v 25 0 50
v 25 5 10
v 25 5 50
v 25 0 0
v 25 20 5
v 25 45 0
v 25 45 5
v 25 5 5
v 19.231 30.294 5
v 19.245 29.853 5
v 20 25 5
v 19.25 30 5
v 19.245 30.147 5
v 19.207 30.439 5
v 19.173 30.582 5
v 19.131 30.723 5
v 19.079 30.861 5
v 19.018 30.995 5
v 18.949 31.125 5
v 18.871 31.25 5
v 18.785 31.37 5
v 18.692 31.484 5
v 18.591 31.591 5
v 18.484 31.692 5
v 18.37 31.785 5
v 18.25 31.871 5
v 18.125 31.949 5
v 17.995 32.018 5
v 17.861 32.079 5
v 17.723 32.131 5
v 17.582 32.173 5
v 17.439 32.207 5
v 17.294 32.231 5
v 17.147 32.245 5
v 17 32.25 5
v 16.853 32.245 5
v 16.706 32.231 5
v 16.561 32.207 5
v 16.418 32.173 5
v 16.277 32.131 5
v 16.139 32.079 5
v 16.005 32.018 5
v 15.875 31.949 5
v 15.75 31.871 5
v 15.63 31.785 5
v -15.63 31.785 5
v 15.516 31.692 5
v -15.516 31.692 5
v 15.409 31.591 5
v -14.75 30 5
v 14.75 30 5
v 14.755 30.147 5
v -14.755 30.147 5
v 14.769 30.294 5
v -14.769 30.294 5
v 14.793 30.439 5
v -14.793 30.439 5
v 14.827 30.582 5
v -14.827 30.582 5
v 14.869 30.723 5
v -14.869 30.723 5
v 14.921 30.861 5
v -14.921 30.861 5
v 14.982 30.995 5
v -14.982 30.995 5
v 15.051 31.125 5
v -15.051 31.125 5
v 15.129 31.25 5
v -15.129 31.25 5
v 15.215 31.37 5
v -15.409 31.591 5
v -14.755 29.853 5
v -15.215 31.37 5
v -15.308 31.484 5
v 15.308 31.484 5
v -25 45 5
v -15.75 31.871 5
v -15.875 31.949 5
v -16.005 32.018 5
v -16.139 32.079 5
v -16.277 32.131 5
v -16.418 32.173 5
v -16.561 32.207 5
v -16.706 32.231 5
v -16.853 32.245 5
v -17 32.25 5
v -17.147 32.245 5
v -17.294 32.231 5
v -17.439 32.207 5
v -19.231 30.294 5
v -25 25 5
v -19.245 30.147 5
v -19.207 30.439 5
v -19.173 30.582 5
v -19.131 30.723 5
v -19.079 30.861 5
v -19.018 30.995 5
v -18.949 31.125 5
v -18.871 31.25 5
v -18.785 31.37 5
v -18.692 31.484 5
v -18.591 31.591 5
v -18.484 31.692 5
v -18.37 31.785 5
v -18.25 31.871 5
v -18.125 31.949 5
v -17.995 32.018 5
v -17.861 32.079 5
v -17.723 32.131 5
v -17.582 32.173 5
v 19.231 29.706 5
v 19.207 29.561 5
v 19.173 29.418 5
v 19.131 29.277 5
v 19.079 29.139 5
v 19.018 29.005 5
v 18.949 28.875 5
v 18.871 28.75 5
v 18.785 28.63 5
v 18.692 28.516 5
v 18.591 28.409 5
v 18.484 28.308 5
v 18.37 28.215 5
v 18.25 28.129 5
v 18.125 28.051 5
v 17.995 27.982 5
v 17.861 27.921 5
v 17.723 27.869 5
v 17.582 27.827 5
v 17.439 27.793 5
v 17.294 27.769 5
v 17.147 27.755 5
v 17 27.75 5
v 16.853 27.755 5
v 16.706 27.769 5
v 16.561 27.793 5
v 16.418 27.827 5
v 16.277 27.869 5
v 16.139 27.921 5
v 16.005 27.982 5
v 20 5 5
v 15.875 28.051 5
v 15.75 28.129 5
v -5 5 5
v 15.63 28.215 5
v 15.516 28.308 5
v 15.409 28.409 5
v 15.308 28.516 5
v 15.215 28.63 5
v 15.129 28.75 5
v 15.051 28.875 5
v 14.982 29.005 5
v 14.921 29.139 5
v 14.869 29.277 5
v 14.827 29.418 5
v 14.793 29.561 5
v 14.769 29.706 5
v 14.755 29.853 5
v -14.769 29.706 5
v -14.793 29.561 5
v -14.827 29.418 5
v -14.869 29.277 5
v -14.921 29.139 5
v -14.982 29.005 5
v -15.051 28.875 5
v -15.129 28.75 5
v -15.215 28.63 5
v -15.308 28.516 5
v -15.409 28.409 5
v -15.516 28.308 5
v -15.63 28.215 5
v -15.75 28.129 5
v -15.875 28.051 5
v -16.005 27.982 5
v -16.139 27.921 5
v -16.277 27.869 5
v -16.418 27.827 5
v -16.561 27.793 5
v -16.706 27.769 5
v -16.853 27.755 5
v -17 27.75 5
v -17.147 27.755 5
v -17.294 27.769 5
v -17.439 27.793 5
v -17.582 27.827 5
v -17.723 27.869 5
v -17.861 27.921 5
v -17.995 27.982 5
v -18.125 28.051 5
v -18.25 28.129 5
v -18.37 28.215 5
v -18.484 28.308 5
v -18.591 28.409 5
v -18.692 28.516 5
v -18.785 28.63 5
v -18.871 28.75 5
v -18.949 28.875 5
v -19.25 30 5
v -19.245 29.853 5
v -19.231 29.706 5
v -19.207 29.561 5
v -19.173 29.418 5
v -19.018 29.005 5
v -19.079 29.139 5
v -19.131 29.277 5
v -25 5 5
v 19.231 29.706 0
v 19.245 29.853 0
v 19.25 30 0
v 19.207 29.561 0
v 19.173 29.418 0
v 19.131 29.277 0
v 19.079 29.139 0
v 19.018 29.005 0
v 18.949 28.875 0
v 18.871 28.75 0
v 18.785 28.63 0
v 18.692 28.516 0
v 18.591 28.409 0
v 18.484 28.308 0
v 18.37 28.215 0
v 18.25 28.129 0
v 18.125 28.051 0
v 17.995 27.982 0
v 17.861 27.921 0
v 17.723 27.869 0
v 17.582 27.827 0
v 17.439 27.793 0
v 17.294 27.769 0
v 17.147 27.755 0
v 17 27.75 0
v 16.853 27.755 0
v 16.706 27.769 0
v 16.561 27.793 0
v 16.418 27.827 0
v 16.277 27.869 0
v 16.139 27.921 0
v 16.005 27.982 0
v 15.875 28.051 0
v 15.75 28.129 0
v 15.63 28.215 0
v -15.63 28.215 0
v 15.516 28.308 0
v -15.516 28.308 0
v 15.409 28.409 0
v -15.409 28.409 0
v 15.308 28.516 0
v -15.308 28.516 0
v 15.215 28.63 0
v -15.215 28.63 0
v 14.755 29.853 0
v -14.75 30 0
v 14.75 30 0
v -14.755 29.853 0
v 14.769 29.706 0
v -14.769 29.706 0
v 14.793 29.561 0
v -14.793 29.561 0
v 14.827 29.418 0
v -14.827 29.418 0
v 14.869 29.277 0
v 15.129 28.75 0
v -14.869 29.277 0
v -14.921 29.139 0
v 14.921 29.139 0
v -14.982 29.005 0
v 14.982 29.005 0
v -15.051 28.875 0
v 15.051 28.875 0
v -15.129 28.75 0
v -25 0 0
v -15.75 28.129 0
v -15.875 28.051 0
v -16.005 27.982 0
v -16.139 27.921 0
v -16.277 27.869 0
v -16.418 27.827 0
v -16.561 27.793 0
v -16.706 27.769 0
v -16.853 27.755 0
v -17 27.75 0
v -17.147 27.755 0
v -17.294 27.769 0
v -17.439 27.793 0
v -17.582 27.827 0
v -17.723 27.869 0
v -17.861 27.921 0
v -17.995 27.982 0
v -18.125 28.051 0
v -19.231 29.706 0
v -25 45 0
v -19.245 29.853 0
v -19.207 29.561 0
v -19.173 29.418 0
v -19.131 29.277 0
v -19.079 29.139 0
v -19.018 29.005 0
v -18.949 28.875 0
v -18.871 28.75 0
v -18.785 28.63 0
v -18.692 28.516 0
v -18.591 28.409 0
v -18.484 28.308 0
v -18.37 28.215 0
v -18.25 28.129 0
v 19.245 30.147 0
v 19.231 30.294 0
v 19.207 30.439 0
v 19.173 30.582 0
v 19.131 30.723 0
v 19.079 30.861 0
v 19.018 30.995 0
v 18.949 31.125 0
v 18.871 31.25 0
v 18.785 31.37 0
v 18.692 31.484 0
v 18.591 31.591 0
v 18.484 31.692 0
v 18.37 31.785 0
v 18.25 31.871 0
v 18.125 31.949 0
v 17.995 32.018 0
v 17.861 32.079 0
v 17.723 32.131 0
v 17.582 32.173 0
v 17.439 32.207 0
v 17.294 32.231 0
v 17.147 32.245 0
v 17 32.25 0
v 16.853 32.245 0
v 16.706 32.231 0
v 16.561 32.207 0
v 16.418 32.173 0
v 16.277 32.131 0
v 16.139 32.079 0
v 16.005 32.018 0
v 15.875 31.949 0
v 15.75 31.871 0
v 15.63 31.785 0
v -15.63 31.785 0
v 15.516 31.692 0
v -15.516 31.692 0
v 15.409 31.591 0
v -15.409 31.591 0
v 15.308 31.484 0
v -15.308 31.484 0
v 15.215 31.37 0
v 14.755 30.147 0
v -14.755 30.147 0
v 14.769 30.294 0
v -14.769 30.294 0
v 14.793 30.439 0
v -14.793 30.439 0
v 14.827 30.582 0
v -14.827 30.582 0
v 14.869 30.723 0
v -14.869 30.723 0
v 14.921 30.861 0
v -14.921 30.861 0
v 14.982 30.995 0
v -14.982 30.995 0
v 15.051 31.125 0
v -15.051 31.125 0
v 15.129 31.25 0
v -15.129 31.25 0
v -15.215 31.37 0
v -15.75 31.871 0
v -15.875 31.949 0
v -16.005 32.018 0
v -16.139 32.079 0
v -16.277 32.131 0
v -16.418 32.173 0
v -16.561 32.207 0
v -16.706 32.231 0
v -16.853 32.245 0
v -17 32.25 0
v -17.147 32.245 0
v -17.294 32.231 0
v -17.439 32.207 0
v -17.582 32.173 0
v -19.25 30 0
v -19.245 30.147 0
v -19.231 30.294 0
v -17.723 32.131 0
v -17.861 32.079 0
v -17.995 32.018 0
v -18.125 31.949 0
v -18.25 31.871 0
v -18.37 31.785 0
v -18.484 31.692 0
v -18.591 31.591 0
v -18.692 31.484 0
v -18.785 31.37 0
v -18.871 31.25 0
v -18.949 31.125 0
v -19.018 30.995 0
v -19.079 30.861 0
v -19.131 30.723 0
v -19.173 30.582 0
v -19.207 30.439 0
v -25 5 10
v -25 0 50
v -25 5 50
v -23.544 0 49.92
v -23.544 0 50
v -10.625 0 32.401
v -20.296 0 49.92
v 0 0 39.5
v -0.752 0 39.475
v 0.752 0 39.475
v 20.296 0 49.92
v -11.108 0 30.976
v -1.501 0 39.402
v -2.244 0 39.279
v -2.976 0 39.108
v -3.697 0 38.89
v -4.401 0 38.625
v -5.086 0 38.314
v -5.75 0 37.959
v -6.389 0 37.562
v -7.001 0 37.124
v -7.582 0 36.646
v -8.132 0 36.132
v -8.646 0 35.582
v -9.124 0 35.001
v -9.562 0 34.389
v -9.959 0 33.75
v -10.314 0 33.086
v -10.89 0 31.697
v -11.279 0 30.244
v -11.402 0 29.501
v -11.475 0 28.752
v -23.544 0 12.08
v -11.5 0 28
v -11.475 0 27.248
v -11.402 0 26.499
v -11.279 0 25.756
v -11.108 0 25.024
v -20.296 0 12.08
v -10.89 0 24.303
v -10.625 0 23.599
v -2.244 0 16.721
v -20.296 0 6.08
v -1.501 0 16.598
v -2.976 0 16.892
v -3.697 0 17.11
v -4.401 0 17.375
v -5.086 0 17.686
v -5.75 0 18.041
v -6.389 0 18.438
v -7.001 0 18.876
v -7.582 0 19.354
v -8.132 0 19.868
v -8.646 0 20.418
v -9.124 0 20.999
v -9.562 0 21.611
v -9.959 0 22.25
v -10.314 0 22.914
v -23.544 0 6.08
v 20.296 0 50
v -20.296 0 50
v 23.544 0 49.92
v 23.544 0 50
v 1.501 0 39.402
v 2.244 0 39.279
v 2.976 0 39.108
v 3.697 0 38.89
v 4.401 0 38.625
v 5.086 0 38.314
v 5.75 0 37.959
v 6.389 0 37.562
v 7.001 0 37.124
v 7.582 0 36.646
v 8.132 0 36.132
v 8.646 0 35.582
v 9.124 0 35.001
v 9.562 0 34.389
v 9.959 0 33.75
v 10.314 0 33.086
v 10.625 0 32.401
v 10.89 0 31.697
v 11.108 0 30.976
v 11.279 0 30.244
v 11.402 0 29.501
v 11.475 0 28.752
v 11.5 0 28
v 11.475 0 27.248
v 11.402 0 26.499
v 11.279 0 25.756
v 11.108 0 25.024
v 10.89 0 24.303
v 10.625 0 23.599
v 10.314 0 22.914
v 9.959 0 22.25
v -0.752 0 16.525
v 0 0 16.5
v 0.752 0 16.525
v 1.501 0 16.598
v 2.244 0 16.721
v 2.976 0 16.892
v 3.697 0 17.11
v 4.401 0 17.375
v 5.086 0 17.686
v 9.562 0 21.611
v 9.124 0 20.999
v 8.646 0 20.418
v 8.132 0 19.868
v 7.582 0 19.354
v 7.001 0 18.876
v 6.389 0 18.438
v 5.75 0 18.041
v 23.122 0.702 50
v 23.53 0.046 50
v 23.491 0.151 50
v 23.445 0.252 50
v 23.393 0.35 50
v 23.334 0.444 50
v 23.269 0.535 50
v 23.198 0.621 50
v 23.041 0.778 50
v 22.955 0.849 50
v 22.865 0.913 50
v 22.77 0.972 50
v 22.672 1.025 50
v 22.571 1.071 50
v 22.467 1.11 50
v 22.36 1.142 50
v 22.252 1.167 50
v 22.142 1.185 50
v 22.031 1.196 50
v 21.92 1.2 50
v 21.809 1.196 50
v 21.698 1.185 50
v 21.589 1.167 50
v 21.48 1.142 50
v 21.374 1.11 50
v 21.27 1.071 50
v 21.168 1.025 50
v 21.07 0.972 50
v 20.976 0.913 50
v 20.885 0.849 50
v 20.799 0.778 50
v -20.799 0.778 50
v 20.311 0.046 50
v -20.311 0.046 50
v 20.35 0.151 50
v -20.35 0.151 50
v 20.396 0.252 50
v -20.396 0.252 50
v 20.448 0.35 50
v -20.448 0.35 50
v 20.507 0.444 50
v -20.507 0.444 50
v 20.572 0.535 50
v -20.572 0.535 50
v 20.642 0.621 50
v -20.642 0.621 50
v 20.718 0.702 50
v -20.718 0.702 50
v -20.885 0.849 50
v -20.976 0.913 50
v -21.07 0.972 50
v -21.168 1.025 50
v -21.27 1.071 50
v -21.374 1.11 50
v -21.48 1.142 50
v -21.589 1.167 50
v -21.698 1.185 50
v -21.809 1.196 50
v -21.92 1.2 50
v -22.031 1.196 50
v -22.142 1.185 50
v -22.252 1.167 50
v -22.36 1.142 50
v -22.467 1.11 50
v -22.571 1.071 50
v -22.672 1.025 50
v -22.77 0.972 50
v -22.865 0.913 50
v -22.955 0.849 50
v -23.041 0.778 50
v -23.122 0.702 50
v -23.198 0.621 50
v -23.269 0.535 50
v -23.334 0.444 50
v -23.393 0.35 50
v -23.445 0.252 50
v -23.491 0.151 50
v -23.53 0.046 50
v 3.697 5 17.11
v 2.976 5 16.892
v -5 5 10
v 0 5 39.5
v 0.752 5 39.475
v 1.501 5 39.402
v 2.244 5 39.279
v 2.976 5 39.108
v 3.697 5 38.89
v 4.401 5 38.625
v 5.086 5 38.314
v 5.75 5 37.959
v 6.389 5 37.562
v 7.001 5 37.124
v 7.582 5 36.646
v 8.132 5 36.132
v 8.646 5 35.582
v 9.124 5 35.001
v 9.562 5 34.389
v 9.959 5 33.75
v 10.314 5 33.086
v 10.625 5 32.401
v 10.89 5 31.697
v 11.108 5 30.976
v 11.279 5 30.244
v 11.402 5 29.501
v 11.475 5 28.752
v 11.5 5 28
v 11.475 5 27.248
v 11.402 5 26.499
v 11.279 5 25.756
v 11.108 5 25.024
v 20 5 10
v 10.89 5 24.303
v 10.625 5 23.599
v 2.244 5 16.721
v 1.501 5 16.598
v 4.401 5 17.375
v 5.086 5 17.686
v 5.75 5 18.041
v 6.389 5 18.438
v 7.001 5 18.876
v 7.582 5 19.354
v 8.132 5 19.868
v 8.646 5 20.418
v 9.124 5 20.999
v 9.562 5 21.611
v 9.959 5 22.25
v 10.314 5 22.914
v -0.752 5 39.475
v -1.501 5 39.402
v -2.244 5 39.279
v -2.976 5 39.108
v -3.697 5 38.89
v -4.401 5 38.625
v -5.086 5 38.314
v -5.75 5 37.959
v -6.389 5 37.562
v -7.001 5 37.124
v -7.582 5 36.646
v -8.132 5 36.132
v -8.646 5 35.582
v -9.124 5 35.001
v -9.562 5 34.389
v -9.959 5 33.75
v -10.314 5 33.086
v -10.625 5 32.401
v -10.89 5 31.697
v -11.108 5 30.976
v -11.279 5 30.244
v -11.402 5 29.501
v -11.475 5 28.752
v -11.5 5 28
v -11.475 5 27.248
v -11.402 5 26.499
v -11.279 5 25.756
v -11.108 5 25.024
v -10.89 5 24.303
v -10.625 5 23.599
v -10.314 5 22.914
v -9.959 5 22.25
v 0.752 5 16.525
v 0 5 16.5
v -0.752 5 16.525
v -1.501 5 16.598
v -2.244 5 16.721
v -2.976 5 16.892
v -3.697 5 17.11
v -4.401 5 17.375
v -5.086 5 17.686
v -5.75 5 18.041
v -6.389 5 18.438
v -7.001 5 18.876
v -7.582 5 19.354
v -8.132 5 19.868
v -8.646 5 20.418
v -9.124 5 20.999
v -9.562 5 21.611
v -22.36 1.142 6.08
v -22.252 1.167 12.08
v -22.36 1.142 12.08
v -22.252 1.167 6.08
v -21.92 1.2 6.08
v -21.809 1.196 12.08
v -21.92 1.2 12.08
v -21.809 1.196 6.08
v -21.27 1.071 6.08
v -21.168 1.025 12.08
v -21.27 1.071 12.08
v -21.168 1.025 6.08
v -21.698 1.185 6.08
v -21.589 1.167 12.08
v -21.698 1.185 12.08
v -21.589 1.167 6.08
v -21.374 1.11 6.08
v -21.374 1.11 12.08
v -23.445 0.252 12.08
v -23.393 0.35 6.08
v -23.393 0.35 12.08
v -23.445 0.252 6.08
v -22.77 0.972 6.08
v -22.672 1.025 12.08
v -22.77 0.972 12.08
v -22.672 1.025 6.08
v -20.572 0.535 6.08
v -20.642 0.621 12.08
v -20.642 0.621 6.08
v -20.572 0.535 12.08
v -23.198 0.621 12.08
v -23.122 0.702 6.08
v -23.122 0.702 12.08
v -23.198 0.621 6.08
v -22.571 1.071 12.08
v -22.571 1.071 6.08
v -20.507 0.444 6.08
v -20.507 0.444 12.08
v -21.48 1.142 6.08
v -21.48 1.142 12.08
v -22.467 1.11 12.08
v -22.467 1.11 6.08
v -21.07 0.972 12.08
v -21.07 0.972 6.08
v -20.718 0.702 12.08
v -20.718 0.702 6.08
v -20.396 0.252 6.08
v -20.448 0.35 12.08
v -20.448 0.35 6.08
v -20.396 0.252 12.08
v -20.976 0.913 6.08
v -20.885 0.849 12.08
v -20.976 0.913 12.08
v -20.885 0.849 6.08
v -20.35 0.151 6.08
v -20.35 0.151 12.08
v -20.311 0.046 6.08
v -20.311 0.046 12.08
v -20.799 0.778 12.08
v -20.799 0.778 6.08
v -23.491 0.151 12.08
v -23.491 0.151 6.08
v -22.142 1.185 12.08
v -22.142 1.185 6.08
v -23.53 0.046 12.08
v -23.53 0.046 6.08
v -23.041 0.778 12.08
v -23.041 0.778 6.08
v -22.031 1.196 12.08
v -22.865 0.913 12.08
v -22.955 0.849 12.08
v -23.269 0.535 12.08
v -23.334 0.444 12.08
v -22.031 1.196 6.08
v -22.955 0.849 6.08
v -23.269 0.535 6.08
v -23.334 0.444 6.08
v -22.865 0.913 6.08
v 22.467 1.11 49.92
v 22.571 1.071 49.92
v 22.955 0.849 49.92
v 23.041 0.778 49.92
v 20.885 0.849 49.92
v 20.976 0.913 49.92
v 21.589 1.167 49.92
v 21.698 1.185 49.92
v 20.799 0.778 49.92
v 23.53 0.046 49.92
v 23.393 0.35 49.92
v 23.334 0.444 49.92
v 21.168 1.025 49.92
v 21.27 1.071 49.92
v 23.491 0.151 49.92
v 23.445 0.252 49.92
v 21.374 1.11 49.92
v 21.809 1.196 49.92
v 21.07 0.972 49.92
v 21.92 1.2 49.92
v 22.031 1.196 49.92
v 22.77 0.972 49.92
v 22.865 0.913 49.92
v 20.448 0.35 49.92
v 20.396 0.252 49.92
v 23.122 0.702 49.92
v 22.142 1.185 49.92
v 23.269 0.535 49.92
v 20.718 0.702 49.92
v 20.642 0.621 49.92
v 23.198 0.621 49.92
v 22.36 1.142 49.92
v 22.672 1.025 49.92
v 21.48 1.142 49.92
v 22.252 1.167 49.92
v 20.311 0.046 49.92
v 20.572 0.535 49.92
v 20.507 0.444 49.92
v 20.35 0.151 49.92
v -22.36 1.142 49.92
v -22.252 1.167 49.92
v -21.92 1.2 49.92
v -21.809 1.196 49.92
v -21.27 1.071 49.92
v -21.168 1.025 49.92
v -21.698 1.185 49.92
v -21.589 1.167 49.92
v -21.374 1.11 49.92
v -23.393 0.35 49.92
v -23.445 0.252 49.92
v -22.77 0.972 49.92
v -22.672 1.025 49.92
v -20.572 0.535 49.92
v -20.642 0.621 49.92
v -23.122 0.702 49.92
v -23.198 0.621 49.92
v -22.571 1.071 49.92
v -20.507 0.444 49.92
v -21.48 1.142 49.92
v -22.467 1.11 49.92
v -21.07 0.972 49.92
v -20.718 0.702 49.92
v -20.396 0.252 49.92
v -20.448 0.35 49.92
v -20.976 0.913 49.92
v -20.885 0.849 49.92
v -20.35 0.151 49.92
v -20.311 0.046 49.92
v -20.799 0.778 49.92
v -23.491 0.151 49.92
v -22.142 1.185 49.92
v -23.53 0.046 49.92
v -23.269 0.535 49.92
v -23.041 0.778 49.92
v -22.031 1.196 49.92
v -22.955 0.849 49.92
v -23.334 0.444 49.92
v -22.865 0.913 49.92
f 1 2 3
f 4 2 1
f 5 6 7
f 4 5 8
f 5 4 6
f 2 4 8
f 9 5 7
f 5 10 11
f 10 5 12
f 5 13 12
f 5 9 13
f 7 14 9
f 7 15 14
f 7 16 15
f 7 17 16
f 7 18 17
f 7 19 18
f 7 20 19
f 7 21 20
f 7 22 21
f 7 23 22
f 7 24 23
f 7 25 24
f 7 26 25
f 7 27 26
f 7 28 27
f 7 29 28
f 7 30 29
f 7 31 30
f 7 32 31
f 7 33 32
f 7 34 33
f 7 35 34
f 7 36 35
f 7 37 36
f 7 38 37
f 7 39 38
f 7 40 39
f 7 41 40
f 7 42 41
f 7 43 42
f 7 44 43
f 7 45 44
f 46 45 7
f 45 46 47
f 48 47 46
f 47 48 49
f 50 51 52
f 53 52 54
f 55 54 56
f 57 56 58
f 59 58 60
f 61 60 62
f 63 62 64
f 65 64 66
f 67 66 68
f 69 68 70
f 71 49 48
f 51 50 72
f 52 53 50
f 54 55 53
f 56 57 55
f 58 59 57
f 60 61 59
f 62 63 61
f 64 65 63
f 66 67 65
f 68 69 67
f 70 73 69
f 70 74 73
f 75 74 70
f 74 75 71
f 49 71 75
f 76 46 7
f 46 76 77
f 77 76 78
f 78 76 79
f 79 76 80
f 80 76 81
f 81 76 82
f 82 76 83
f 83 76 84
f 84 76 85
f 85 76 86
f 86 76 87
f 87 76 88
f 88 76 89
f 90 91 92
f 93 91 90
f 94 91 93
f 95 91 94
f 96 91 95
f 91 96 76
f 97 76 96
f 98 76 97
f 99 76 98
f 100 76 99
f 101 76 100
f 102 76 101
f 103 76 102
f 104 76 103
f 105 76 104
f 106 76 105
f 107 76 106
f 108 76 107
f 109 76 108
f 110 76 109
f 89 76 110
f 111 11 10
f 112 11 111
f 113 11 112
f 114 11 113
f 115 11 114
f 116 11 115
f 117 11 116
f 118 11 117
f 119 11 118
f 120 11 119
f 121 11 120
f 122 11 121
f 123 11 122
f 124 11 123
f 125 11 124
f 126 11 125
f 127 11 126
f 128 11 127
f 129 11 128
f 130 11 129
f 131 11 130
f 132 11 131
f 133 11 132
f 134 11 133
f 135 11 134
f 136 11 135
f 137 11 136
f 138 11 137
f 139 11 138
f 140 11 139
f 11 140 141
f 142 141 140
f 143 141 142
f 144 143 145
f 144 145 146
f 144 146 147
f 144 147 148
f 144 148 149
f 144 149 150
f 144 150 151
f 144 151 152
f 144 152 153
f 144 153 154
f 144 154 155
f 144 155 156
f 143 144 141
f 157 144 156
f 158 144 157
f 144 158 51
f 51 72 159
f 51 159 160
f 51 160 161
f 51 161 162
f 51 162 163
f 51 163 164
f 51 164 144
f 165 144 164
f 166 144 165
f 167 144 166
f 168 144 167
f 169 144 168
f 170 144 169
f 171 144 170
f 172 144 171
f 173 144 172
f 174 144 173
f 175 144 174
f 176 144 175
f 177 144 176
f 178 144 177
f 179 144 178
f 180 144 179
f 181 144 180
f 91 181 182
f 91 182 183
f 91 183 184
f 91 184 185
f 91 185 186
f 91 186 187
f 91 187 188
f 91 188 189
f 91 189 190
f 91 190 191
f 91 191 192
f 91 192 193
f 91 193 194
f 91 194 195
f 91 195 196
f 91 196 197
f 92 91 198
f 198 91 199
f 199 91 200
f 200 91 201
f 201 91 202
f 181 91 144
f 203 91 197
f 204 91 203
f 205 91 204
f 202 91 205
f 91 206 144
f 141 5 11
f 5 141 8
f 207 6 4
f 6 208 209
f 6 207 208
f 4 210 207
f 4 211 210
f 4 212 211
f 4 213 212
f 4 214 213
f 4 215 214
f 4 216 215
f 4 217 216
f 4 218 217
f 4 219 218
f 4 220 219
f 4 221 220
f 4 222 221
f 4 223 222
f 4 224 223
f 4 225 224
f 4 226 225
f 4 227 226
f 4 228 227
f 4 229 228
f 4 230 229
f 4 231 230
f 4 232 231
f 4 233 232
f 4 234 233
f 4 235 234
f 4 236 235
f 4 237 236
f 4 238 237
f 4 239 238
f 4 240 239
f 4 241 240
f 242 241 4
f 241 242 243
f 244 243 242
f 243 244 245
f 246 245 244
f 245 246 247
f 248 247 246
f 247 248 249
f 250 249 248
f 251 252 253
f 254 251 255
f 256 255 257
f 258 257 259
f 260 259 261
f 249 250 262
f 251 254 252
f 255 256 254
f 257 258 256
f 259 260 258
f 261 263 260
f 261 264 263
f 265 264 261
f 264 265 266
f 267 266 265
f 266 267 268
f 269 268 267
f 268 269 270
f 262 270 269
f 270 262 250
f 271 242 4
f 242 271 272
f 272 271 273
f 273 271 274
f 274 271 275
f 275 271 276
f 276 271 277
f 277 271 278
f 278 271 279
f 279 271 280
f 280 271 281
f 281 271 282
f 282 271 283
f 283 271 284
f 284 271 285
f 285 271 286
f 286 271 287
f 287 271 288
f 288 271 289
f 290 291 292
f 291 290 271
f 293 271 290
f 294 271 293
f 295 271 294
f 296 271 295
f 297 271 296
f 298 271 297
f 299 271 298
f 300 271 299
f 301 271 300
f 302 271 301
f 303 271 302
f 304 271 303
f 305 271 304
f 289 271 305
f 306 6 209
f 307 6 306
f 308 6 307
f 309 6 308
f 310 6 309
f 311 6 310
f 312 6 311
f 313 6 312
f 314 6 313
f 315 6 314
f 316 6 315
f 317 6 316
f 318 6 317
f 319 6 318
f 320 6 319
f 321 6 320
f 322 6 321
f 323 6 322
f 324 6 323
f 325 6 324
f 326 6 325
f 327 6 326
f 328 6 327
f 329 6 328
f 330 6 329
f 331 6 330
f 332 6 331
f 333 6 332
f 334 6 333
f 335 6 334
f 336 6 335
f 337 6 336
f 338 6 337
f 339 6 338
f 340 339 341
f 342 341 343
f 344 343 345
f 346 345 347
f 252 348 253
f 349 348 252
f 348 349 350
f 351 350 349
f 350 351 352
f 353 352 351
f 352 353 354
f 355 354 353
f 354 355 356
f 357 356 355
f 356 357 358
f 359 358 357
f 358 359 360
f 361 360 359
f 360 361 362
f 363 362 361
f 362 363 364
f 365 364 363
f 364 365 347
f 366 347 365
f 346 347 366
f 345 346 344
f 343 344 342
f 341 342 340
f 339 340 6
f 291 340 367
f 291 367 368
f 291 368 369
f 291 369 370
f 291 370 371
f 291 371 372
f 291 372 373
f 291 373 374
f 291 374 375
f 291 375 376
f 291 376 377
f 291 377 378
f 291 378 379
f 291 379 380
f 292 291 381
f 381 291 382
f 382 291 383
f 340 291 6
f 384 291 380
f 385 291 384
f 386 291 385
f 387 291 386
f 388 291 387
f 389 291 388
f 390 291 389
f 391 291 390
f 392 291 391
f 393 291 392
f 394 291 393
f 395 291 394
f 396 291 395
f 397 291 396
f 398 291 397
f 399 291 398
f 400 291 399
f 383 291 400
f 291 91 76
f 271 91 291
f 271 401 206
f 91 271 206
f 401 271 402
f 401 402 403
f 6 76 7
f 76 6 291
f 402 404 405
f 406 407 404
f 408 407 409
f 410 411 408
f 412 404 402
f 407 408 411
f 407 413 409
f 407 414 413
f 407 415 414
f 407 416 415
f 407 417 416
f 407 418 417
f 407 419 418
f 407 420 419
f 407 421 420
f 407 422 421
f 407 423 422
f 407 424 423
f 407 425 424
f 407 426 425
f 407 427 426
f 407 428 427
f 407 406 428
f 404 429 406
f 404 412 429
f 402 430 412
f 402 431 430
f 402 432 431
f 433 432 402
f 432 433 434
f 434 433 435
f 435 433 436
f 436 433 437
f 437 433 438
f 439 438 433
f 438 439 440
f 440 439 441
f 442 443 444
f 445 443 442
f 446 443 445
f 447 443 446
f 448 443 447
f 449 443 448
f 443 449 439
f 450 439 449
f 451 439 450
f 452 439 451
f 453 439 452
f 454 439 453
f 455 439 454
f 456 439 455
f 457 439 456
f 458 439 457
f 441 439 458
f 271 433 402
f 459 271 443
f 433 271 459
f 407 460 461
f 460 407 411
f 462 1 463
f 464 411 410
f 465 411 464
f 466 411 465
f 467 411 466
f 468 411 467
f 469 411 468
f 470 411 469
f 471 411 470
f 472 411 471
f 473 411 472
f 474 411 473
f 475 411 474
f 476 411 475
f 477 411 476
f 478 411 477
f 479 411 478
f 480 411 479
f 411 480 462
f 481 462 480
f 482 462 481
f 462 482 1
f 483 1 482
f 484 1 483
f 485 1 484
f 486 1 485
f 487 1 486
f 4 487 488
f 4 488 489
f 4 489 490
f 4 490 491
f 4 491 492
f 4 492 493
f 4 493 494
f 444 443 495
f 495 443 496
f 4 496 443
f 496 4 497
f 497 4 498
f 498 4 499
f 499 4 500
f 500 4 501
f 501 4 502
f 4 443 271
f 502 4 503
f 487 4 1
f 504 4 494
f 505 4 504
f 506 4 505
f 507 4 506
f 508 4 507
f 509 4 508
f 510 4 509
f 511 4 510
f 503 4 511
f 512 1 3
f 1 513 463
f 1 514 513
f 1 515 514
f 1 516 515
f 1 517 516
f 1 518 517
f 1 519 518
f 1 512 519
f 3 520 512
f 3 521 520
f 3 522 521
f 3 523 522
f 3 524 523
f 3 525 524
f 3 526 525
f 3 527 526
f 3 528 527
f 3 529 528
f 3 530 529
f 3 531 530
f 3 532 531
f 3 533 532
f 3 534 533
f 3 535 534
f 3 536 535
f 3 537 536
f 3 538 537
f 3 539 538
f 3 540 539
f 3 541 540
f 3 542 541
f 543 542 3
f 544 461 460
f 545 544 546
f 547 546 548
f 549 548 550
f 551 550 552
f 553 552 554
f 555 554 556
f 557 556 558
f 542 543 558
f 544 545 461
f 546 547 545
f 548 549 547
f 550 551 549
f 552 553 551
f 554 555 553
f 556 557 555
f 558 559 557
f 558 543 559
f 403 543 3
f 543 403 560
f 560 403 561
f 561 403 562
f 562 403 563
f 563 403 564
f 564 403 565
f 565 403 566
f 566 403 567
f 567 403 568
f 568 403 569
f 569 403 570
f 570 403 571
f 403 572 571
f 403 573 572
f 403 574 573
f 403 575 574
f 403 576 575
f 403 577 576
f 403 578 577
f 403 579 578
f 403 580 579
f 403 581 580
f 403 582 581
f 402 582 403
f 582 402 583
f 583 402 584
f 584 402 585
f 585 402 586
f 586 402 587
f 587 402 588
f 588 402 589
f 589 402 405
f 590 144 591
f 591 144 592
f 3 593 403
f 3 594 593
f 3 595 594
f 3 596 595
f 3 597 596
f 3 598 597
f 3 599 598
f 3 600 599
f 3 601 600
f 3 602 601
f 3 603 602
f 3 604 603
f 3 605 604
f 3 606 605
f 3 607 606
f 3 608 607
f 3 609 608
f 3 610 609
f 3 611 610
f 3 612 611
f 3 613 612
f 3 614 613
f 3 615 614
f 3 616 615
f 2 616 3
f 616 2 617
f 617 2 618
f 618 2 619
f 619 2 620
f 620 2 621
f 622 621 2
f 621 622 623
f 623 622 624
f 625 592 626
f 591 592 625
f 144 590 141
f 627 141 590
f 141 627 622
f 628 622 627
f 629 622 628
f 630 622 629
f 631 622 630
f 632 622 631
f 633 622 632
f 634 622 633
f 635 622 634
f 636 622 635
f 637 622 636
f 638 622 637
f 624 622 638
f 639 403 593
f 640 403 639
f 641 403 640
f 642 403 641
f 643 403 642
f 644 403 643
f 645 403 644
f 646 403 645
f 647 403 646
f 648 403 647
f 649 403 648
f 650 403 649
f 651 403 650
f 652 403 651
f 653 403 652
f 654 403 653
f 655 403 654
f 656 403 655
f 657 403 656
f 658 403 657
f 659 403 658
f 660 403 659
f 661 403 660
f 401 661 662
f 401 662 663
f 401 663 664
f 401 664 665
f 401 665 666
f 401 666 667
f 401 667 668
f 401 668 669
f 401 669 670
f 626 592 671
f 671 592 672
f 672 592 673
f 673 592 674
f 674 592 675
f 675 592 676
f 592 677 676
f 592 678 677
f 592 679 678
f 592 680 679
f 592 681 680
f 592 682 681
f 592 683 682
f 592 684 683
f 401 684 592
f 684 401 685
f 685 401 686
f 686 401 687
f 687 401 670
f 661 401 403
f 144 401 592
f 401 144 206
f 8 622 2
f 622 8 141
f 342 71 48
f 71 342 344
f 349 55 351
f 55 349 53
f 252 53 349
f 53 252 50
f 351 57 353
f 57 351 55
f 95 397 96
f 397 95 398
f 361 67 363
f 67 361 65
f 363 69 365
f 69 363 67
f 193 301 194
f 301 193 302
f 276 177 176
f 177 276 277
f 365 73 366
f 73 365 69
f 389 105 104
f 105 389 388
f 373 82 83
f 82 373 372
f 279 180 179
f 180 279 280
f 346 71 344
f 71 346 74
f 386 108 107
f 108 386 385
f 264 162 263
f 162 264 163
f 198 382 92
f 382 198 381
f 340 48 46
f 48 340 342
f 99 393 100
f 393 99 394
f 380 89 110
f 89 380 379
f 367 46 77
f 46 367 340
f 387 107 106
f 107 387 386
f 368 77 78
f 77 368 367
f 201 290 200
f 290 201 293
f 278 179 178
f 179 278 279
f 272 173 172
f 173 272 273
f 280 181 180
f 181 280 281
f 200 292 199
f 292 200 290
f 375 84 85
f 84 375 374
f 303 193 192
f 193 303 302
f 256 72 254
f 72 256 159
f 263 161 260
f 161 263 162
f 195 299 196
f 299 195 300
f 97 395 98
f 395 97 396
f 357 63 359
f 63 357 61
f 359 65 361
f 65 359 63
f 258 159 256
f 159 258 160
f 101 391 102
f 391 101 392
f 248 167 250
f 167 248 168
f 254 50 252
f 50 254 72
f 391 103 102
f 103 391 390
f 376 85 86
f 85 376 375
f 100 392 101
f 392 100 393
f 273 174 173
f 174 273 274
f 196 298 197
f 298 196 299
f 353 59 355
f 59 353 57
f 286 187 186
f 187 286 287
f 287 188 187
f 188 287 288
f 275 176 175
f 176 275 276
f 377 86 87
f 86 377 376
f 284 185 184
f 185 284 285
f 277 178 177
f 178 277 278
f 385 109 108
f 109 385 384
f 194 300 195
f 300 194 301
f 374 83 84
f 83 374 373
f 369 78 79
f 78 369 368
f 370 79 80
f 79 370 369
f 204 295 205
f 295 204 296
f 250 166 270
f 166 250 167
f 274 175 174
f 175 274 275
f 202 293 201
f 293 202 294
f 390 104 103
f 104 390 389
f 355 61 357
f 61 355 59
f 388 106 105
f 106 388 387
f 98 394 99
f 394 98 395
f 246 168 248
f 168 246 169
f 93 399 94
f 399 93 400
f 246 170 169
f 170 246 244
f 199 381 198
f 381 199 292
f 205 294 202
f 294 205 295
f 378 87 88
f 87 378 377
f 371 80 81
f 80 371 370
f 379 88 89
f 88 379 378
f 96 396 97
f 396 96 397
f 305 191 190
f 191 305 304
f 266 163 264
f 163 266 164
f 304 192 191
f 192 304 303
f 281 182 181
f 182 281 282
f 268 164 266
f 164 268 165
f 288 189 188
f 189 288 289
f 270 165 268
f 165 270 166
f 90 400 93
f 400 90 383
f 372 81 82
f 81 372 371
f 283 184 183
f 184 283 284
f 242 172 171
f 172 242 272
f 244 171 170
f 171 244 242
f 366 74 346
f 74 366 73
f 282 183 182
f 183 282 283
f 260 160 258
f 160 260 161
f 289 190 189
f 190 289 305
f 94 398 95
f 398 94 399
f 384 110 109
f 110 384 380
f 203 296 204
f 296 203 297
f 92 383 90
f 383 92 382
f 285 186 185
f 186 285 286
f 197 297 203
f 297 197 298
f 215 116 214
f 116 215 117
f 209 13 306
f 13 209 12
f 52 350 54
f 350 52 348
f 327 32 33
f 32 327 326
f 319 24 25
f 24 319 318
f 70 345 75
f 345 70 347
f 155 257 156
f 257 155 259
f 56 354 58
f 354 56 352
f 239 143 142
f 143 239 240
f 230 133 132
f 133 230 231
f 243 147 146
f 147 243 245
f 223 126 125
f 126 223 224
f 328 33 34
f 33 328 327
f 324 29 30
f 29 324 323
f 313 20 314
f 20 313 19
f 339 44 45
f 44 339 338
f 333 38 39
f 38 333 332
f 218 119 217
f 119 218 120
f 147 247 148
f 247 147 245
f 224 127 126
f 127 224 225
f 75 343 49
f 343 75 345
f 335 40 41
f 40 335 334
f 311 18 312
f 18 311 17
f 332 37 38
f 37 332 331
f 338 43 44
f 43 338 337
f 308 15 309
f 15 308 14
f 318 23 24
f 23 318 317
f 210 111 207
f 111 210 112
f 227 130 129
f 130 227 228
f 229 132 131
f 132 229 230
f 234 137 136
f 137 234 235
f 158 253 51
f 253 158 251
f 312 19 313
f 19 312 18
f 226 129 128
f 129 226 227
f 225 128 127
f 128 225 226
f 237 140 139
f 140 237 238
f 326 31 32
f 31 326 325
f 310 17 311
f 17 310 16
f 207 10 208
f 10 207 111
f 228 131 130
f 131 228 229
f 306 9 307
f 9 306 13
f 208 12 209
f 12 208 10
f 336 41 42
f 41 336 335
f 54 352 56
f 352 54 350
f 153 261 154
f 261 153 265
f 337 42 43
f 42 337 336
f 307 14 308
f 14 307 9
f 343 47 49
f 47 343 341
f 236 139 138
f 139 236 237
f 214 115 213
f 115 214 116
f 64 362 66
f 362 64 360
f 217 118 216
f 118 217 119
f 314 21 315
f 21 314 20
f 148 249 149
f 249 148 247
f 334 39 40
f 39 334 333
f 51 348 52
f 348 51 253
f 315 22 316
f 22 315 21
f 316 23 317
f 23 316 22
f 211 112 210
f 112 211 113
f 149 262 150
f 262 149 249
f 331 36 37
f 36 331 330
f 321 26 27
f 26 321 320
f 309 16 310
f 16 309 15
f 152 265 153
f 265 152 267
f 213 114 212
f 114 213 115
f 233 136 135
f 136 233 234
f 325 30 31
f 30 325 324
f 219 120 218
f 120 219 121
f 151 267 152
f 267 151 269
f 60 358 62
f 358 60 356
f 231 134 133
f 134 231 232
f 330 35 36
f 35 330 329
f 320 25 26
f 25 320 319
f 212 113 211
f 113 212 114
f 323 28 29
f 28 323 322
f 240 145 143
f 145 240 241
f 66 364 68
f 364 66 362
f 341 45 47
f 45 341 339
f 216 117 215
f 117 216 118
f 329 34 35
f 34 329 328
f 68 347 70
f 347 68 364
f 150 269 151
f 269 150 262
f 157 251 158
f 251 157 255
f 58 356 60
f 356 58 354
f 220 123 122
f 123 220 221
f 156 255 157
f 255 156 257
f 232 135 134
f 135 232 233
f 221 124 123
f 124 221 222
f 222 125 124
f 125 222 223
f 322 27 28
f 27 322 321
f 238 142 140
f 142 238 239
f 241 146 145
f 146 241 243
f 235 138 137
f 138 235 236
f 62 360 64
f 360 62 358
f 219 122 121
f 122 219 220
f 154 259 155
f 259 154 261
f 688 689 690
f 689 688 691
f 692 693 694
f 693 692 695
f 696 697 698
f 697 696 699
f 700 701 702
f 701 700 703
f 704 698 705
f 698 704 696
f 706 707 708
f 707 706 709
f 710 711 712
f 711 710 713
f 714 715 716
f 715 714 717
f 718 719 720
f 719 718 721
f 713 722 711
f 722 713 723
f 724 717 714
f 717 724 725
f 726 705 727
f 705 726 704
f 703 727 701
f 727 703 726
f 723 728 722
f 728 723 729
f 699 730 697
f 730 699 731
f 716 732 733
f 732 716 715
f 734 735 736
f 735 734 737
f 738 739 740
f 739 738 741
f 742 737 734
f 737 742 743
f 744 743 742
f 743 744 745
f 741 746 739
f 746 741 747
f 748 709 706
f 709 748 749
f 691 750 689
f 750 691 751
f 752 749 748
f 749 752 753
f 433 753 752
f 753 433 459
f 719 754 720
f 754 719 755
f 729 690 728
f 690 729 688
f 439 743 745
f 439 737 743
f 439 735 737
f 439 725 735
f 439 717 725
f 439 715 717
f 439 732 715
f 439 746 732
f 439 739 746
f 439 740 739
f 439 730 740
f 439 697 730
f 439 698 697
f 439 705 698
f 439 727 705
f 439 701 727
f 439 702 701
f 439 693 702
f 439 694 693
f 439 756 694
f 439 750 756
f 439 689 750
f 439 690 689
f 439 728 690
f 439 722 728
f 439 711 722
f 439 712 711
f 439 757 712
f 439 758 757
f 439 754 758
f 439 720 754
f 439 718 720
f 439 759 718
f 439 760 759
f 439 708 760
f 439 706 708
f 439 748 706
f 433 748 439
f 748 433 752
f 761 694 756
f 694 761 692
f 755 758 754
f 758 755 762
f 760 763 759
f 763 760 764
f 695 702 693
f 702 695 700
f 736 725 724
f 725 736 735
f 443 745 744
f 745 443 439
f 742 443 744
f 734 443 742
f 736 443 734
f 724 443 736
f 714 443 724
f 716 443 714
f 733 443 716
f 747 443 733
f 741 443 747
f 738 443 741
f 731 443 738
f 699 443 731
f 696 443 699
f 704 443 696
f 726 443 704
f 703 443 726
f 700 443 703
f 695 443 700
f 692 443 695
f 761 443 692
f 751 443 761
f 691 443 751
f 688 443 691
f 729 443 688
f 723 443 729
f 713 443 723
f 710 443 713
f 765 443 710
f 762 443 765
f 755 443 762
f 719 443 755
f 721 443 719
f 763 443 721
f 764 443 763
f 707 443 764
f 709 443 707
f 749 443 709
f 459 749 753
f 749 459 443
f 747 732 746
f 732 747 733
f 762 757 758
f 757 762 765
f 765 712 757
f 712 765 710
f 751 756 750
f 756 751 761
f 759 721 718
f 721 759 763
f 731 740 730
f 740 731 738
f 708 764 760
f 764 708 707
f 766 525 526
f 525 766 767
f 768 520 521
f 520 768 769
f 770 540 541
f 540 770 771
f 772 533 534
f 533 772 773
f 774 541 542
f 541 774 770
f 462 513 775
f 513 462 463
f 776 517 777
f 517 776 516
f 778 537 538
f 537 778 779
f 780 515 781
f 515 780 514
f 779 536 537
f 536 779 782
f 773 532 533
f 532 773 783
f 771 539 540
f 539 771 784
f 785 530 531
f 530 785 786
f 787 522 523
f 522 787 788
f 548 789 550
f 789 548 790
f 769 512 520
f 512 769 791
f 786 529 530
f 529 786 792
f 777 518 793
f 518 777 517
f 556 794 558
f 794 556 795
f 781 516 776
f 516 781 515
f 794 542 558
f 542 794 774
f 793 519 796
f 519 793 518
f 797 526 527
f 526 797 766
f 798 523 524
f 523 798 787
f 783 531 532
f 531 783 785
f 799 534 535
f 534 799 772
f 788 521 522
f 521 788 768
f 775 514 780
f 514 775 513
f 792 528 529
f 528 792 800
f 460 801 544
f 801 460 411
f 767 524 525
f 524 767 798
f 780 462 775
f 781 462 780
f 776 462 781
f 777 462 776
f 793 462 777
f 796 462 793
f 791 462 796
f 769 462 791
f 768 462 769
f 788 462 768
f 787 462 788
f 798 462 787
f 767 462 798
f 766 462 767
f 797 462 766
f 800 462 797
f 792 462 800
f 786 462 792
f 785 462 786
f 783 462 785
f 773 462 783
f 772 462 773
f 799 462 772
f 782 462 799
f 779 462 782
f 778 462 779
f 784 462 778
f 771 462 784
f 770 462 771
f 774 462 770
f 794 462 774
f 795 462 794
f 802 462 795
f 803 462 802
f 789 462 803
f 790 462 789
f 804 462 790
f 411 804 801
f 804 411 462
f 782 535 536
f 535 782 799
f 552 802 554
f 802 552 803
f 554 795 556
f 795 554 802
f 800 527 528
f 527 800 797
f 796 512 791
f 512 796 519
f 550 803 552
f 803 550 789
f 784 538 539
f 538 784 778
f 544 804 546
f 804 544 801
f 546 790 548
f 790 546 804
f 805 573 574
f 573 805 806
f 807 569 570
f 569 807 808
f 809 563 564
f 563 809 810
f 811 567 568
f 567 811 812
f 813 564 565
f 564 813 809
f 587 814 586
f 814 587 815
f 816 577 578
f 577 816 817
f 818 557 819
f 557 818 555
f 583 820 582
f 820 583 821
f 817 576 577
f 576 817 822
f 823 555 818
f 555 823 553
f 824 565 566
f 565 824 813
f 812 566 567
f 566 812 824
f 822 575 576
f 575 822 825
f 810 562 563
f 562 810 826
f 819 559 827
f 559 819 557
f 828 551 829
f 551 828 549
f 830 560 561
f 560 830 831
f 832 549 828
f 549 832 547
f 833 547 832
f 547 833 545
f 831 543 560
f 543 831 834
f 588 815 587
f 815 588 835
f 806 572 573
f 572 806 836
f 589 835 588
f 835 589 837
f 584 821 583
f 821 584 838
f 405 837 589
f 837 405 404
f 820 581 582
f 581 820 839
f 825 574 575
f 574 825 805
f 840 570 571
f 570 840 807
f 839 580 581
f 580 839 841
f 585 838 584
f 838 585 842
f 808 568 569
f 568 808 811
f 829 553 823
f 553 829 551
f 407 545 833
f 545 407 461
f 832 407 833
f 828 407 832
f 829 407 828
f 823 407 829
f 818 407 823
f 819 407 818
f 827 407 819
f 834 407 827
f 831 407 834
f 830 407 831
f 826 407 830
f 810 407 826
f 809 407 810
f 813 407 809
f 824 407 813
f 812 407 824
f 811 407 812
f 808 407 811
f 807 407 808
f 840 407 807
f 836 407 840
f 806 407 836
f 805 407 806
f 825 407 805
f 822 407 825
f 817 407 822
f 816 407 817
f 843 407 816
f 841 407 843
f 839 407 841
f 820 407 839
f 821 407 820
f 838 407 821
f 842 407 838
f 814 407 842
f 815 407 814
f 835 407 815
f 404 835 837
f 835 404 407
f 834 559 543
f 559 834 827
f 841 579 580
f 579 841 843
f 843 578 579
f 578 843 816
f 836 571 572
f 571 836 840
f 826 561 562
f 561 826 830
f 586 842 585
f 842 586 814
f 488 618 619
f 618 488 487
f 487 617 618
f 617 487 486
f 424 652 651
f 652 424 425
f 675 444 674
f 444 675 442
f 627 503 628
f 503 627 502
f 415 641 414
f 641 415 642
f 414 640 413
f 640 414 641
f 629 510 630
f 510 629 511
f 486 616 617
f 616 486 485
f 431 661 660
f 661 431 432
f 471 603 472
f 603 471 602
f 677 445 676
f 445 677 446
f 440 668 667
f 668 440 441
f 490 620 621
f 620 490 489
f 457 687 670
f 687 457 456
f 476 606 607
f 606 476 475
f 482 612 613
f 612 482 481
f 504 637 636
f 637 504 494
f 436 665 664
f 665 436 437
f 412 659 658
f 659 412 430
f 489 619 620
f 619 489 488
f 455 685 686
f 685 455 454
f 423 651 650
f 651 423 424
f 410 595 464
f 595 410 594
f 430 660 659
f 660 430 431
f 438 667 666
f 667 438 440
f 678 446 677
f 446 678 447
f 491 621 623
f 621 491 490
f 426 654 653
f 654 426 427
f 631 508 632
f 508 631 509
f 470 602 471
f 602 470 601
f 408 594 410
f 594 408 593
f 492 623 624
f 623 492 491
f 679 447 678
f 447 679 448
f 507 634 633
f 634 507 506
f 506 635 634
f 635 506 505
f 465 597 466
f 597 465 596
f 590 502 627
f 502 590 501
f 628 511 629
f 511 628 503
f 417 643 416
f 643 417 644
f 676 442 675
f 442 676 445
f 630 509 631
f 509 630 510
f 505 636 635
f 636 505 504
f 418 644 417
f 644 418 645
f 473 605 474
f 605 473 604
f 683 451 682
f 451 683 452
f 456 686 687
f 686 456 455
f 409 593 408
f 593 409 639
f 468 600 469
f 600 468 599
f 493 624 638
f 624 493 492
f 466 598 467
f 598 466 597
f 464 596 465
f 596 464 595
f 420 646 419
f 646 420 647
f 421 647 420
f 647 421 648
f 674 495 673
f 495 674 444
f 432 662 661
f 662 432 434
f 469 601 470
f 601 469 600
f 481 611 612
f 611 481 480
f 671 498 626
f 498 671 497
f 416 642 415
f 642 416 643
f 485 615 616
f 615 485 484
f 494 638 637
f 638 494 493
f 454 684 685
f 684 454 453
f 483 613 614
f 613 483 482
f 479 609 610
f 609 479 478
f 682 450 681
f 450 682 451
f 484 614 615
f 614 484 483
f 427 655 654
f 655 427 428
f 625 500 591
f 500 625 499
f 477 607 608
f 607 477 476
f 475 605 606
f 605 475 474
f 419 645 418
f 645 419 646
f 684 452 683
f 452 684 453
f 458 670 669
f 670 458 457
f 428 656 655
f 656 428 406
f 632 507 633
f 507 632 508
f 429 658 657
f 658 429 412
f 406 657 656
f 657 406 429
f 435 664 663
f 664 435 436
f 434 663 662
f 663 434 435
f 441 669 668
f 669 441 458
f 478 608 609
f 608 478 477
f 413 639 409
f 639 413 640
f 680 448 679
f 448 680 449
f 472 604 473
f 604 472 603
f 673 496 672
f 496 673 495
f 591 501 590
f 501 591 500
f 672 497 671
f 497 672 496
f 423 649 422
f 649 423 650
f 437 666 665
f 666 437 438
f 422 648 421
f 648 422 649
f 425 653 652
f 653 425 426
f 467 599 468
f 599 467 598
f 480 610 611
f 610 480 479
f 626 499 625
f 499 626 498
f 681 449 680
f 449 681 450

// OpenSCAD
// NEMA 17 stepper motor L-shaped mounting bracket
// Print orientation: base plate on the bed, vertical plate standing on its back edge

// ---------- Parameters ----------
base_x1      = -25;   // base plate left edge (X)
base_x2      = 25;    // base plate right edge (X)
base_y       = 45;    // base plate length (Y)
base_z       = 5;     // base plate thickness (Z)

motor_x1     = -25;   // motor plate left edge (X)
motor_x2     = 25;    // motor plate right edge (X)
motor_y      = 5;     // motor plate thickness (Y)
motor_z      = 50;    // motor plate height (Z)

boss_d       = 23;    // motor centring boss hole diameter
boss_x       = 0;     // boss hole centre X
boss_z       = 28;    // boss hole centre Z

screw_d      = 3.4;   // M3 screw hole diameter
screw_pitch  = 31;    // screw hole square pattern size
screw_n      = 4;     // number of screw holes

gusset_t     = 5;     // gusset thickness (X)
gusset_y     = 20;    // gusset leg along +Y
gusset_z     = 20;    // gusset leg along +Z

hole_d       = 4.5;   // M4 through-hole diameter (base plate)
eps          = 0.5;   // cutter overshoot past faces

$fn = 96;

// ---------- Model ----------
difference() {
    union() {
        // Base plate
        translate([base_x1, 0, 0])
            cube([base_x2 - base_x1, base_y, base_z]);

        // Vertical motor plate
        translate([motor_x1, 0, 0])
            cube([motor_x2 - motor_x1, motor_y, motor_z]);
    }

    // Through-holes in base plate
    for (sx = [-17, 17])
        translate([sx, 30, -eps])
            cylinder(d = hole_d, h = base_z + 2 * eps);

    // Motor centring boss hole (along Y)
    translate([boss_x, -eps, boss_z])
        rotate([-90, 0, 0])
            cylinder(d = boss_d, h = motor_y + 2 * eps);

    // M3 screw holes on square pattern, centred on boss hole
    for (i = [0 : screw_n - 1]) {
        a = screw_pitch / sqrt(2);
        x = (i % 2 == 0) ? -a : a;
        z = (i / 2 == 0) ? boss_z - a : boss_z + a;
        translate([x, -eps, z])
            cylinder(d = screw_d, h = motor_y + 2 * eps);
    }

    // Triangular gussets, flush with left and right edges
    for (dx = [-25, 20])
        translate([dx, 5, 5])
            linear_extrude(height = gusset_t)
                polygon([[0, 0], [gusset_y, 0], [0, gusset_z]]);
}
